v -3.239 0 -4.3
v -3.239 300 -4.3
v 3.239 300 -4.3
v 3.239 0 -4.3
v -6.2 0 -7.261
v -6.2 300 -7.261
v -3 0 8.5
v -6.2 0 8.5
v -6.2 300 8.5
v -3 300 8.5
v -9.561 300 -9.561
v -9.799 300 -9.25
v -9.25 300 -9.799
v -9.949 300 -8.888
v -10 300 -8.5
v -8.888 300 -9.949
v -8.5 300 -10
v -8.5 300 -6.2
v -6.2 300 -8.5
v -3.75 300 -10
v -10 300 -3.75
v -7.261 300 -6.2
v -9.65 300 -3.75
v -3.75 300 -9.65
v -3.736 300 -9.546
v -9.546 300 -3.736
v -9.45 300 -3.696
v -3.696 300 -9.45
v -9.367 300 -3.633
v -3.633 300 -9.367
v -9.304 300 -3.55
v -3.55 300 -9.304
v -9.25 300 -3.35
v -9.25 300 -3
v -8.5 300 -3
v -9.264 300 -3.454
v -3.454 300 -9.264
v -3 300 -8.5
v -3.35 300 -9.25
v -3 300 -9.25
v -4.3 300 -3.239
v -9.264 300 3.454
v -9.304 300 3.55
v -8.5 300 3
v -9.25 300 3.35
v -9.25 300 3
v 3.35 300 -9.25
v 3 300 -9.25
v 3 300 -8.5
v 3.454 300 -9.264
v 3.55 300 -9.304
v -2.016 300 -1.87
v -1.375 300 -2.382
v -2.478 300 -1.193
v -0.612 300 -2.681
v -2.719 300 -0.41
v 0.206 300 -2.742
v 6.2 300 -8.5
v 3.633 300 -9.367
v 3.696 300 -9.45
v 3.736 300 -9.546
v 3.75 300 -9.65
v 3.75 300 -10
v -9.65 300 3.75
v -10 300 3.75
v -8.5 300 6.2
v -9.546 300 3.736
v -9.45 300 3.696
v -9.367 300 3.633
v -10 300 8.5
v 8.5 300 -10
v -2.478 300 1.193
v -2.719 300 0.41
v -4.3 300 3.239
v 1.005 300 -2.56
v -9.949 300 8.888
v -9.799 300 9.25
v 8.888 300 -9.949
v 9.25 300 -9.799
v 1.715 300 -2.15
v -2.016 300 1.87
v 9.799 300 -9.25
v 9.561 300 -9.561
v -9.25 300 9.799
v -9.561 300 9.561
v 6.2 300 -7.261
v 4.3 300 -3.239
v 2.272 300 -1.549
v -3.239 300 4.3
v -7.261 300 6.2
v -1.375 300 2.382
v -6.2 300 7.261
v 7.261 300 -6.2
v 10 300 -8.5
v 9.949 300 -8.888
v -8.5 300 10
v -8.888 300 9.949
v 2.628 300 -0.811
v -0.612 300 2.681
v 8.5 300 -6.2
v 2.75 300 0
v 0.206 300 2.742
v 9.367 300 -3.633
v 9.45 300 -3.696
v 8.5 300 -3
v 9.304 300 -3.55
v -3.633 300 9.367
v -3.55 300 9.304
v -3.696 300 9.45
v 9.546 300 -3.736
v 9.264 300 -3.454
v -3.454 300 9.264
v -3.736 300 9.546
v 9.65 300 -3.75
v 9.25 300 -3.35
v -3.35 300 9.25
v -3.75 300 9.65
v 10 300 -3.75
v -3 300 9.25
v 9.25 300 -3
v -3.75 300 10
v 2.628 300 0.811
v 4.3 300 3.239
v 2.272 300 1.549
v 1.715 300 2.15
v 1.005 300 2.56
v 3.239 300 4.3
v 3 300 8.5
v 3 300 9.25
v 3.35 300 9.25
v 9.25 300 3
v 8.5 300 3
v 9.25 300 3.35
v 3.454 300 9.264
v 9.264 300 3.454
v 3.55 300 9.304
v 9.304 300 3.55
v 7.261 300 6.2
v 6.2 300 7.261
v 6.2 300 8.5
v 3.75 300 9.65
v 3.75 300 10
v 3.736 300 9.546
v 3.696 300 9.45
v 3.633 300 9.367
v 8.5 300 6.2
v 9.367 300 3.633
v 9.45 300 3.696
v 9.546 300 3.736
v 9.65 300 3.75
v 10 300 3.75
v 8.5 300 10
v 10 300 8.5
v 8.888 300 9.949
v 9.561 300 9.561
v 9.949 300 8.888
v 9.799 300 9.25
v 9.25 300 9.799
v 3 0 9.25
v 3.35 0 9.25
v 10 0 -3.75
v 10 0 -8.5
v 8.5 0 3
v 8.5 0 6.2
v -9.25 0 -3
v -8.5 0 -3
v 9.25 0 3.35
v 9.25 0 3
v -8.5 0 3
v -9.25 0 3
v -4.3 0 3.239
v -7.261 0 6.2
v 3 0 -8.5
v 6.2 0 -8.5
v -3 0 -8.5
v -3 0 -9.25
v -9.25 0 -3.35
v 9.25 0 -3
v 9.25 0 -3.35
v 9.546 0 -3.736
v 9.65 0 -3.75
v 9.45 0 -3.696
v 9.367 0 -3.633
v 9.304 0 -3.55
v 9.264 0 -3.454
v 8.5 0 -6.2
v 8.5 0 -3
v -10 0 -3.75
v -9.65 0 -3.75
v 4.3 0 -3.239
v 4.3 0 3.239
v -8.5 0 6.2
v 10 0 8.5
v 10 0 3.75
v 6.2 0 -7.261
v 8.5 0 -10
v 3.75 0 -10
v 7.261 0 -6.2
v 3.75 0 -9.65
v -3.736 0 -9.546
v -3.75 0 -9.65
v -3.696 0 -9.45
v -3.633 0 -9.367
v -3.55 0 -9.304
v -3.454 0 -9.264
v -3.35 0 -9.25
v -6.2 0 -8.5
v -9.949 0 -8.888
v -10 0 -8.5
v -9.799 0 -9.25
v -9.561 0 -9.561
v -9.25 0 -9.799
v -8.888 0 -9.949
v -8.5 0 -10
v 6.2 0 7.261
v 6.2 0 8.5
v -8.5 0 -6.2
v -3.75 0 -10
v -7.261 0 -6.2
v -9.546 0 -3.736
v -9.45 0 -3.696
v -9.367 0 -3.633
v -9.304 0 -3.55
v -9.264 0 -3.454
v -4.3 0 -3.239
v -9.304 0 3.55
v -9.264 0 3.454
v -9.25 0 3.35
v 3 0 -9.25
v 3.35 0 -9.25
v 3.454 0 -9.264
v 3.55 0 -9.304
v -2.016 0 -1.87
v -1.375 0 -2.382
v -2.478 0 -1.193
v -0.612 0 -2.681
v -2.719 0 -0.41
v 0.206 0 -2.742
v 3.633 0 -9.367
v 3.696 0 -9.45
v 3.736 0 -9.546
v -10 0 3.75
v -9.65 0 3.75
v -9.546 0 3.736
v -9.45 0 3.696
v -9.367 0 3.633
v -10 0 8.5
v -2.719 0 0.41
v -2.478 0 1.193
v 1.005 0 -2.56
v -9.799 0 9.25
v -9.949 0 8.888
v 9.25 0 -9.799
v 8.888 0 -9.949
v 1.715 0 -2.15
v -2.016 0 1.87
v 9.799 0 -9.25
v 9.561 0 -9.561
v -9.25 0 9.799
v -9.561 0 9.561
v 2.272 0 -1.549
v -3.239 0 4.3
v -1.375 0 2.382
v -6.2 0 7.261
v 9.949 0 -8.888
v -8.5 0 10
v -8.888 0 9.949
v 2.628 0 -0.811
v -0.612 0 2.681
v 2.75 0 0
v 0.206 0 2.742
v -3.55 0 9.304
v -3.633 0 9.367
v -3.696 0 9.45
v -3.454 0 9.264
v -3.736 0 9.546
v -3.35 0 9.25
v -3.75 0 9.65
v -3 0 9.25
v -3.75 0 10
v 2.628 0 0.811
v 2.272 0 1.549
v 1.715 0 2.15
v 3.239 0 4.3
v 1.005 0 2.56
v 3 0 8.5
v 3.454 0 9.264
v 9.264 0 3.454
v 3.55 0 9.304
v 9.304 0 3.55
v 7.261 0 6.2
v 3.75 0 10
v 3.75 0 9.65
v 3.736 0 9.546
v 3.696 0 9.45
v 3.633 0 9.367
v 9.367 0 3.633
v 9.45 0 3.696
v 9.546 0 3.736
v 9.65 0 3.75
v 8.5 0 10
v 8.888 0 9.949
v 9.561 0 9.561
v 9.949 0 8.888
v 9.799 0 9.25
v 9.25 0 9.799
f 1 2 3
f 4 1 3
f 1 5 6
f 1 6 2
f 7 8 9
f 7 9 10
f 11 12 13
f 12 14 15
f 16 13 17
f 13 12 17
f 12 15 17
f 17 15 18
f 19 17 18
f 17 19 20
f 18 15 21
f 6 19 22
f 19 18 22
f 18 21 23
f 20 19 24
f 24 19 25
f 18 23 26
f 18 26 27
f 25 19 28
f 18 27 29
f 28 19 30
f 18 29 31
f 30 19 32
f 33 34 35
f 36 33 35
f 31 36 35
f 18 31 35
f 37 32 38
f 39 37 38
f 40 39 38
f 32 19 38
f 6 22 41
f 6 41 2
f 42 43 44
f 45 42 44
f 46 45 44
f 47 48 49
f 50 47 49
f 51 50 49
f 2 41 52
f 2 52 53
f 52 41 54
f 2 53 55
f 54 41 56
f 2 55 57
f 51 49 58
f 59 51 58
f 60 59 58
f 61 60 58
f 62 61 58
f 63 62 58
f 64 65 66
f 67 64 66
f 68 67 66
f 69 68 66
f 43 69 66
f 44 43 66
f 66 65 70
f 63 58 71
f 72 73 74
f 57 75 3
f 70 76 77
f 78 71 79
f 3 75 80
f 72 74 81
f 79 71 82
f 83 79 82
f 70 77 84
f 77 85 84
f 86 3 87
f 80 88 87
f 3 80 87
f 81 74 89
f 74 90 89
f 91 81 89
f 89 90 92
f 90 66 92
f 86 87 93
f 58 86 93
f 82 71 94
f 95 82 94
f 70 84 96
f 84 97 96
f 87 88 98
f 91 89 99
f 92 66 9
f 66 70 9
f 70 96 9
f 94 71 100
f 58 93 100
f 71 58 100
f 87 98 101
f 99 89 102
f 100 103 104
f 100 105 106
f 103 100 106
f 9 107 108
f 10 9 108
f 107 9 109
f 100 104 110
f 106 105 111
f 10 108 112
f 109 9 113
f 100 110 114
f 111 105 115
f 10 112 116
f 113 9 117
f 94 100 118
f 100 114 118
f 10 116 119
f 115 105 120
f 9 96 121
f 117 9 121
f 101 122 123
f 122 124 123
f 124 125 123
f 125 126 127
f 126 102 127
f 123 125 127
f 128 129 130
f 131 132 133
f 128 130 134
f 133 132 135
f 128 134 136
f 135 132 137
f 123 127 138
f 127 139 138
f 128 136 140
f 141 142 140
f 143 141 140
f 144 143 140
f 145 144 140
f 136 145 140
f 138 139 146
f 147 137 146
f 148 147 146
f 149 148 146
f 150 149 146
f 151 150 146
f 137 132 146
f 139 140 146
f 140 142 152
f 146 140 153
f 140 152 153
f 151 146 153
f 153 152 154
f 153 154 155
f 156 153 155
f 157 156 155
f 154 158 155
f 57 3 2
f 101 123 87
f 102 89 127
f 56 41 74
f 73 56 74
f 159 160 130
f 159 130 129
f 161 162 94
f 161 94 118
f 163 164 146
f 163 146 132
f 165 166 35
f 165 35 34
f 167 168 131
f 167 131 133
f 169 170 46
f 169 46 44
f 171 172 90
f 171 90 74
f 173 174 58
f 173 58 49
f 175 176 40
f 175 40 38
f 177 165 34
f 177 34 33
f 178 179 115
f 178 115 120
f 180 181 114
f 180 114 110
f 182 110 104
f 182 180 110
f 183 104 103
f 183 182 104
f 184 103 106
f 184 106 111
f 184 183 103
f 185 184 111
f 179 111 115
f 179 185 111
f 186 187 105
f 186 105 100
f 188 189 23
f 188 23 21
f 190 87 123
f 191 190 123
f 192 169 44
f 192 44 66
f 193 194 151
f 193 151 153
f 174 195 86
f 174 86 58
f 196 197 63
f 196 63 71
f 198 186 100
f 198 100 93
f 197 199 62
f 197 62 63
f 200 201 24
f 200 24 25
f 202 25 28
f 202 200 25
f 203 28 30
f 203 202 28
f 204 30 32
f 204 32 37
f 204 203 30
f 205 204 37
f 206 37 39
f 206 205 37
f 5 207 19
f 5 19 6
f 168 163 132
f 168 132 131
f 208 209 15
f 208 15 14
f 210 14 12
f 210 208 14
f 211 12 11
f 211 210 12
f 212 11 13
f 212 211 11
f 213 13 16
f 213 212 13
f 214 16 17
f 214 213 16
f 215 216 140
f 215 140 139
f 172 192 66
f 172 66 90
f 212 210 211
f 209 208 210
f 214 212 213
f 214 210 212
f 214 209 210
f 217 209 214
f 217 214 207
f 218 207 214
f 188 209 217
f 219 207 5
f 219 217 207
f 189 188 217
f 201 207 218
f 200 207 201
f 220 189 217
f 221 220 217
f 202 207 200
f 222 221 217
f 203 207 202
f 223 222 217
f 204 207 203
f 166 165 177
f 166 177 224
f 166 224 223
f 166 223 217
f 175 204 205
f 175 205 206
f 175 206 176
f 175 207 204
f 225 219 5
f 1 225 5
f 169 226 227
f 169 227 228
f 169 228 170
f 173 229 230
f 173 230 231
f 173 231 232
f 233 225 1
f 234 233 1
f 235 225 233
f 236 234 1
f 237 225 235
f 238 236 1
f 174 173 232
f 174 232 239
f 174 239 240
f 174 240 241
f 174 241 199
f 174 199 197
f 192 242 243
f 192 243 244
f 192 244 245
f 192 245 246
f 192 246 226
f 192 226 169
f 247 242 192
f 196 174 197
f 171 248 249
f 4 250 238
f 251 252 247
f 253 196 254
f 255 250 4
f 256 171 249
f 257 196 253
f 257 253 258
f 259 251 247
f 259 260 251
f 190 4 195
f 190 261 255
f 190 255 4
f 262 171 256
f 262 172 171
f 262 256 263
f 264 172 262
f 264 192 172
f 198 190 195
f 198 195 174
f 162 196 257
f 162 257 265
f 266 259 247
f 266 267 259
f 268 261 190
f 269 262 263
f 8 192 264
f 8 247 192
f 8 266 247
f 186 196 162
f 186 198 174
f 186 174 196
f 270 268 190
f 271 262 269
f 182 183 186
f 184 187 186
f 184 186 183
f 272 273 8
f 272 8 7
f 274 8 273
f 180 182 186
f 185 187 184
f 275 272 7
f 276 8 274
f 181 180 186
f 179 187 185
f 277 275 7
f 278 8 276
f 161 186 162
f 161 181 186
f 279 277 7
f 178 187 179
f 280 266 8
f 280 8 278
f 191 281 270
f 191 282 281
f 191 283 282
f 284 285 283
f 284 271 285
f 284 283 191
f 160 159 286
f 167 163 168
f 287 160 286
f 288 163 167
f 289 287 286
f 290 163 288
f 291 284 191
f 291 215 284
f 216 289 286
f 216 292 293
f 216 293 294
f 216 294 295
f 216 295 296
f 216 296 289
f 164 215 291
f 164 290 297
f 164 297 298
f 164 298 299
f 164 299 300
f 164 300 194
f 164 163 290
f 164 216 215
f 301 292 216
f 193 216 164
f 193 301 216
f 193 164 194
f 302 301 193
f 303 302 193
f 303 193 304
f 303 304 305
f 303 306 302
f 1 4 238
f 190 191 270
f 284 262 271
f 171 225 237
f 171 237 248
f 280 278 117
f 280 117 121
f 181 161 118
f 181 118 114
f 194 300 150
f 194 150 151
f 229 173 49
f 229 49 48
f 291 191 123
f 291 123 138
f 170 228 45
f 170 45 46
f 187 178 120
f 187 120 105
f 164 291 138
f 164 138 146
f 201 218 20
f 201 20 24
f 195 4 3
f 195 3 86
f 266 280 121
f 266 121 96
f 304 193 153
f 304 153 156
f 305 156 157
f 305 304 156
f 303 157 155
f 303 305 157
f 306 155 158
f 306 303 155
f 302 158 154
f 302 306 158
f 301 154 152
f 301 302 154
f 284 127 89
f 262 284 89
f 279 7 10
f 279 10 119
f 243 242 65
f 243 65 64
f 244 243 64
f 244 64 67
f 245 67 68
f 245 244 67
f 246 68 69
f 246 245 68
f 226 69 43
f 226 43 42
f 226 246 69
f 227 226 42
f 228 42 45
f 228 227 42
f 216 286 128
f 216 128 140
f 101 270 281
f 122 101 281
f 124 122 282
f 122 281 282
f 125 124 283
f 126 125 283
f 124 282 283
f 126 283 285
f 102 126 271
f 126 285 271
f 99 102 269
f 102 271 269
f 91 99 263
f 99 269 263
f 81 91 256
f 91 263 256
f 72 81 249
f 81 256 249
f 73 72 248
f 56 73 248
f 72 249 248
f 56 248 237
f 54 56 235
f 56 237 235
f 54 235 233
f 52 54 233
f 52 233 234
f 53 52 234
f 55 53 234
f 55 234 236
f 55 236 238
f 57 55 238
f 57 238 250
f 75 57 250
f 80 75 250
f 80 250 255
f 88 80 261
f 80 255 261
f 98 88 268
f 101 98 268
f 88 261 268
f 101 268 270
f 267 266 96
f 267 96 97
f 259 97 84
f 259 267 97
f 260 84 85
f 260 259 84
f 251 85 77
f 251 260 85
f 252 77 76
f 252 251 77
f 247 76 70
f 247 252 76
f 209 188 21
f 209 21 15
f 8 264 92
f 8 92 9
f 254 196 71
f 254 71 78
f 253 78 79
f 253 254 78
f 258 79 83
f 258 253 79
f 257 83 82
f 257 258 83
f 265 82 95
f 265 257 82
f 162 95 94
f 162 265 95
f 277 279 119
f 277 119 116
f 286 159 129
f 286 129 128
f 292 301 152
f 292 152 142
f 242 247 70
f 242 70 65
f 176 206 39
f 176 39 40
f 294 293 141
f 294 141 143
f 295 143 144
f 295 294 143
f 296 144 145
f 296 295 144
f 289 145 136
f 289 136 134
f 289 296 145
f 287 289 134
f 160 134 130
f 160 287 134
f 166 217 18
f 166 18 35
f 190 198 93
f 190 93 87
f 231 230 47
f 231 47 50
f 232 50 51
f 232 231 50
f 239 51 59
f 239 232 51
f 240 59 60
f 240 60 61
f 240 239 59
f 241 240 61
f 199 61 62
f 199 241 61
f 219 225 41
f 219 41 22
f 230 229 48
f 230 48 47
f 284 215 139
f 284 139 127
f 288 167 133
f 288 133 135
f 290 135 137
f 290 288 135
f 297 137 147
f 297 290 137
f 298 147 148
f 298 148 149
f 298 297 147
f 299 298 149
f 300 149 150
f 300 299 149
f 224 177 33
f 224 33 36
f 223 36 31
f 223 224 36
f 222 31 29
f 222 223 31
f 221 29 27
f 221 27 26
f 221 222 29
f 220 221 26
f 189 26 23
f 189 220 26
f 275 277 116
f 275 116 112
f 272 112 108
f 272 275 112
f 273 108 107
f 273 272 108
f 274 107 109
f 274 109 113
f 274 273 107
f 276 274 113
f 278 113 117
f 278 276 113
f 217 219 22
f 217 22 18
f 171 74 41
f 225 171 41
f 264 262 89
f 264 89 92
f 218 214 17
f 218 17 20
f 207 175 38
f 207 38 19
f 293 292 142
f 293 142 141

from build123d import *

# Parameters (mm, degrees)
SKETCH1_R           = 2.75
BOSS_EXTRUDE1_DEPTH = 300


with BuildPart() as part:
    # Sketch1 → Boss-Extrude1 (new body)
    with BuildSketch(Plane.XZ):
        with BuildLine():
            Line((-8.5, -10), (-3.75, -10))
            Line((-3.75, -10), (-3.75, -9.65))
            ThreePointArc((-3.75, -9.65), (-3.632842712, -9.367157288), (-3.35, -9.25))
            Line((-3.35, -9.25), (-3, -9.25))
            Line((-3, -9.25), (-3, -8.5))
            Line((-3, -8.5), (-6.2, -8.5))
            Line((-6.2, -8.5), (-6.2, -7.260660172))
            Line((-6.2, -7.260660172), (-3.239339828, -4.3))
            Line((-3.239339828, -4.3), (3.239339828, -4.3))
            Line((3.239339828, -4.3), (6.2, -7.260660172))
            Line((6.2, -7.260660172), (6.2, -8.5))
            Line((6.2, -8.5), (3, -8.5))
            Line((3, -8.5), (3, -9.25))
            Line((3, -9.25), (3.35, -9.25))
            ThreePointArc((3.35, -9.25), (3.632842712, -9.367157288), (3.75, -9.65))
            Line((3.75, -9.65), (3.75, -10))
            Line((3.75, -10), (8.5, -10))
            ThreePointArc((8.5, -10), (9.560660172, -9.560660172), (10, -8.5))
            Line((10, -8.5), (10, -3.75))
            Line((10, -3.75), (9.65, -3.75))
            ThreePointArc((9.65, -3.75), (9.367157288, -3.632842712), (9.25, -3.35))
            Line((9.25, -3.35), (9.25, -3))
            Line((9.25, -3), (8.5, -3))
            Line((8.5, -3), (8.5, -6.2))
            Line((8.5, -6.2), (7.260660172, -6.2))
            Line((7.260660172, -6.2), (4.3, -3.239339828))
            Line((4.3, -3.239339828), (4.3, 3.239339828))
            Line((4.3, 3.239339828), (7.260660172, 6.2))
            Line((7.260660172, 6.2), (8.5, 6.2))
            Line((8.5, 6.2), (8.5, 3))
            Line((8.5, 3), (9.25, 3))
            Line((9.25, 3), (9.25, 3.35))
            ThreePointArc((9.25, 3.35), (9.367157288, 3.632842712), (9.65, 3.75))
            Line((9.65, 3.75), (10, 3.75))
            Line((10, 3.75), (10, 8.5))
            ThreePointArc((10, 8.5), (9.560660172, 9.560660172), (8.5, 10))
            Line((8.5, 10), (3.75, 10))
            Line((3.75, 10), (3.75, 9.65))
            ThreePointArc((3.75, 9.65), (3.632842712, 9.367157288), (3.35, 9.25))
            Line((3.35, 9.25), (3, 9.25))
            Line((3, 9.25), (3, 8.5))
            Line((3, 8.5), (6.2, 8.5))
            Line((6.2, 8.5), (6.2, 7.260660172))
            Line((6.2, 7.260660172), (3.239339828, 4.3))
            Line((3.239339828, 4.3), (-3.239339828, 4.3))
            Line((-3.239339828, 4.3), (-6.2, 7.260660172))
            Line((-6.2, 7.260660172), (-6.2, 8.5))
            Line((-6.2, 8.5), (-3, 8.5))
            Line((-3, 8.5), (-3, 9.25))
            Line((-3, 9.25), (-3.35, 9.25))
            ThreePointArc((-3.35, 9.25), (-3.632842712, 9.367157288), (-3.75, 9.65))
            Line((-3.75, 9.65), (-3.75, 10))
            Line((-3.75, 10), (-8.5, 10))
            ThreePointArc((-8.5, 10), (-9.560660172, 9.560660172), (-10, 8.5))
            Line((-10, 8.5), (-10, 3.75))
            Line((-10, 3.75), (-9.65, 3.75))
            ThreePointArc((-9.65, 3.75), (-9.367157288, 3.632842712), (-9.25, 3.35))
            Line((-9.25, 3.35), (-9.25, 3))
            Line((-9.25, 3), (-8.5, 3))
            Line((-8.5, 3), (-8.5, 6.2))
            Line((-8.5, 6.2), (-7.260660172, 6.2))
            Line((-7.260660172, 6.2), (-4.3, 3.239339828))
            Line((-4.3, 3.239339828), (-4.3, -3.239339828))
            Line((-4.3, -3.239339828), (-7.260660172, -6.2))
            Line((-7.260660172, -6.2), (-8.5, -6.2))
            Line((-8.5, -6.2), (-8.5, -3))
            Line((-8.5, -3), (-9.25, -3))
            Line((-9.25, -3), (-9.25, -3.35))
            ThreePointArc((-9.25, -3.35), (-9.367157288, -3.632842712), (-9.65, -3.75))
            Line((-9.65, -3.75), (-10, -3.75))
            Line((-10, -3.75), (-10, -8.5))
            ThreePointArc((-10, -8.5), (-9.560660172, -9.560660172), (-8.5, -10))
        make_face()
        Circle(SKETCH1_R, mode=Mode.SUBTRACT)
    extrude(amount=-BOSS_EXTRUDE1_DEPTH)


solid = part.part
